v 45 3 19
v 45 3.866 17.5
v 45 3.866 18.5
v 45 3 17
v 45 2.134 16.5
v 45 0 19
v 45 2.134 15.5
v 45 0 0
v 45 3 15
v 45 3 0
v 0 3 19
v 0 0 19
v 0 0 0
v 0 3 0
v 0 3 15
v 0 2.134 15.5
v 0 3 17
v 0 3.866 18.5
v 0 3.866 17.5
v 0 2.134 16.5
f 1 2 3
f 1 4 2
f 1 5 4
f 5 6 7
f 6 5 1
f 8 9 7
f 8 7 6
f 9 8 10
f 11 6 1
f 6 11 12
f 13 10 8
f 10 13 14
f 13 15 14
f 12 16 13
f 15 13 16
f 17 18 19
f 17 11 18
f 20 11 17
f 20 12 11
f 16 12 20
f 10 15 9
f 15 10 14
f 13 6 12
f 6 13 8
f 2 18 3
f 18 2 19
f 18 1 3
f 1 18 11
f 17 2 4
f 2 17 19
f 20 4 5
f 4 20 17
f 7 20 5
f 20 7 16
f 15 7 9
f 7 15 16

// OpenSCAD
//roundedcorner(4, 10);
//roundedbox(65,45,4, 8);
//roundedshelf(65, 45, 4);
//roundedgroove(65, 3, 2);
//groovedwall(length=45, height=9, thickness=3, groovedepth=4.5);
protrudinghookwall(walllength=45, wallheight=19, wallthickness=3, hooksize=2);

module roundedcorner(height, radius)
{
	intersection()
	{
		cube(size=[radius, radius, height]);
		color([1,0,0]) cylinder(h=height, r=radius, $fn=32);
	}
}

module roundedbox( length, width, height, radius)
{
	strutlength = length - radius*2;
	strutwidth = width - radius*2;

	translate([length-radius, width-radius, 0]) rotate([0,0,0]) roundedcorner(height, radius);

	translate([radius, width-radius, 0]) rotate([0,0,90]) roundedcorner(height, radius);
	
	translate([radius, radius, 0]) rotate([0,0,180]) roundedcorner(height, radius);
	
	translate([length-radius, radius, 0]) rotate([0,0,270]) roundedcorner(height, radius);

	// Connect corners with filler rectangles
	translate([radius, width-radius,0]) cube(size=[strutlength, radius, height]);
	translate([radius, 0,0]) cube(size=[strutlength, radius, height]);
	translate([0, radius, 0]) cube(size=[radius,strutwidth,height]);
	translate([length-radius, radius, 0]) cube(size=[radius,strutwidth,height]);

	// Fill in the center rectangle
	translate([radius, radius,0]) cube(size=[strutlength, strutwidth, height]);
}

module roundedshelf(length, width, height)
{
	rotate([0,90,0]) 
	translate([-height/2,width-(height/2),0])
	union()
	{
		roundedcorner(length, height/2);
		rotate([0,0,90]) roundedcorner(length, height/2);
	}

	cube(size=[length, width-height/2, height]);
}

module roundedgroove(length, width, height)
{
	difference()
	{
		union()
		{
			roundedshelf(length, width, height/3);
			translate([0,0,height/3]) cube(size=[length, width-height/3/2, height/3]);
			translate([0,0,(height/3)*2]) roundedshelf(length, width, height/3);
		}

		// subtract a cylinder to make the smooth bottom of the track
		rotate([0,90,0]) 
		translate([-(height/3)-(height/3)/2,width-height/3/2,-0.25]) 
			cylinder(h=length+0.5, r=(height/3)/2, $fn=32);
	}
}


// Walls
module groovedwall(length, height, thickness, groovedepth)
{
	lowerwallheight = height - groovedepth + groovedepth/3/2;
	
	union()
	{
	// place the lower wall
	color([0,0,1]) cube(size=[length, thickness, lowerwallheight]);
	
	// Place the grooved portion
	translate([0,0,height-groovedepth])
	roundedgroove(length, thickness, groovedepth);
	}
}

module protrudinghookwall(walllength, wallheight, wallthickness, hooksize)
{
	lowerwallheight = wallheight - hooksize *2;

	difference()
	{
		union()
		{
		// place the wall
		color([0,0,1]) cube(size=[walllength, wallthickness, wallheight]);
		
		
		// place the hook cyclinder
		color([1,0,0])
		translate([0, wallthickness, wallheight-(hooksize/2)])
		rotate([0,90,0])
		cylinder(r=hooksize/2, h=walllength, $fn=6);
		}

		// subtract the undercut
		translate([-0.25
, wallthickness, wallheight-(hooksize/2)-hooksize])
		rotate([0,90,0])
		cylinder(r=hooksize/2, h=walllength+0.5, $fn=6);
	}
}
